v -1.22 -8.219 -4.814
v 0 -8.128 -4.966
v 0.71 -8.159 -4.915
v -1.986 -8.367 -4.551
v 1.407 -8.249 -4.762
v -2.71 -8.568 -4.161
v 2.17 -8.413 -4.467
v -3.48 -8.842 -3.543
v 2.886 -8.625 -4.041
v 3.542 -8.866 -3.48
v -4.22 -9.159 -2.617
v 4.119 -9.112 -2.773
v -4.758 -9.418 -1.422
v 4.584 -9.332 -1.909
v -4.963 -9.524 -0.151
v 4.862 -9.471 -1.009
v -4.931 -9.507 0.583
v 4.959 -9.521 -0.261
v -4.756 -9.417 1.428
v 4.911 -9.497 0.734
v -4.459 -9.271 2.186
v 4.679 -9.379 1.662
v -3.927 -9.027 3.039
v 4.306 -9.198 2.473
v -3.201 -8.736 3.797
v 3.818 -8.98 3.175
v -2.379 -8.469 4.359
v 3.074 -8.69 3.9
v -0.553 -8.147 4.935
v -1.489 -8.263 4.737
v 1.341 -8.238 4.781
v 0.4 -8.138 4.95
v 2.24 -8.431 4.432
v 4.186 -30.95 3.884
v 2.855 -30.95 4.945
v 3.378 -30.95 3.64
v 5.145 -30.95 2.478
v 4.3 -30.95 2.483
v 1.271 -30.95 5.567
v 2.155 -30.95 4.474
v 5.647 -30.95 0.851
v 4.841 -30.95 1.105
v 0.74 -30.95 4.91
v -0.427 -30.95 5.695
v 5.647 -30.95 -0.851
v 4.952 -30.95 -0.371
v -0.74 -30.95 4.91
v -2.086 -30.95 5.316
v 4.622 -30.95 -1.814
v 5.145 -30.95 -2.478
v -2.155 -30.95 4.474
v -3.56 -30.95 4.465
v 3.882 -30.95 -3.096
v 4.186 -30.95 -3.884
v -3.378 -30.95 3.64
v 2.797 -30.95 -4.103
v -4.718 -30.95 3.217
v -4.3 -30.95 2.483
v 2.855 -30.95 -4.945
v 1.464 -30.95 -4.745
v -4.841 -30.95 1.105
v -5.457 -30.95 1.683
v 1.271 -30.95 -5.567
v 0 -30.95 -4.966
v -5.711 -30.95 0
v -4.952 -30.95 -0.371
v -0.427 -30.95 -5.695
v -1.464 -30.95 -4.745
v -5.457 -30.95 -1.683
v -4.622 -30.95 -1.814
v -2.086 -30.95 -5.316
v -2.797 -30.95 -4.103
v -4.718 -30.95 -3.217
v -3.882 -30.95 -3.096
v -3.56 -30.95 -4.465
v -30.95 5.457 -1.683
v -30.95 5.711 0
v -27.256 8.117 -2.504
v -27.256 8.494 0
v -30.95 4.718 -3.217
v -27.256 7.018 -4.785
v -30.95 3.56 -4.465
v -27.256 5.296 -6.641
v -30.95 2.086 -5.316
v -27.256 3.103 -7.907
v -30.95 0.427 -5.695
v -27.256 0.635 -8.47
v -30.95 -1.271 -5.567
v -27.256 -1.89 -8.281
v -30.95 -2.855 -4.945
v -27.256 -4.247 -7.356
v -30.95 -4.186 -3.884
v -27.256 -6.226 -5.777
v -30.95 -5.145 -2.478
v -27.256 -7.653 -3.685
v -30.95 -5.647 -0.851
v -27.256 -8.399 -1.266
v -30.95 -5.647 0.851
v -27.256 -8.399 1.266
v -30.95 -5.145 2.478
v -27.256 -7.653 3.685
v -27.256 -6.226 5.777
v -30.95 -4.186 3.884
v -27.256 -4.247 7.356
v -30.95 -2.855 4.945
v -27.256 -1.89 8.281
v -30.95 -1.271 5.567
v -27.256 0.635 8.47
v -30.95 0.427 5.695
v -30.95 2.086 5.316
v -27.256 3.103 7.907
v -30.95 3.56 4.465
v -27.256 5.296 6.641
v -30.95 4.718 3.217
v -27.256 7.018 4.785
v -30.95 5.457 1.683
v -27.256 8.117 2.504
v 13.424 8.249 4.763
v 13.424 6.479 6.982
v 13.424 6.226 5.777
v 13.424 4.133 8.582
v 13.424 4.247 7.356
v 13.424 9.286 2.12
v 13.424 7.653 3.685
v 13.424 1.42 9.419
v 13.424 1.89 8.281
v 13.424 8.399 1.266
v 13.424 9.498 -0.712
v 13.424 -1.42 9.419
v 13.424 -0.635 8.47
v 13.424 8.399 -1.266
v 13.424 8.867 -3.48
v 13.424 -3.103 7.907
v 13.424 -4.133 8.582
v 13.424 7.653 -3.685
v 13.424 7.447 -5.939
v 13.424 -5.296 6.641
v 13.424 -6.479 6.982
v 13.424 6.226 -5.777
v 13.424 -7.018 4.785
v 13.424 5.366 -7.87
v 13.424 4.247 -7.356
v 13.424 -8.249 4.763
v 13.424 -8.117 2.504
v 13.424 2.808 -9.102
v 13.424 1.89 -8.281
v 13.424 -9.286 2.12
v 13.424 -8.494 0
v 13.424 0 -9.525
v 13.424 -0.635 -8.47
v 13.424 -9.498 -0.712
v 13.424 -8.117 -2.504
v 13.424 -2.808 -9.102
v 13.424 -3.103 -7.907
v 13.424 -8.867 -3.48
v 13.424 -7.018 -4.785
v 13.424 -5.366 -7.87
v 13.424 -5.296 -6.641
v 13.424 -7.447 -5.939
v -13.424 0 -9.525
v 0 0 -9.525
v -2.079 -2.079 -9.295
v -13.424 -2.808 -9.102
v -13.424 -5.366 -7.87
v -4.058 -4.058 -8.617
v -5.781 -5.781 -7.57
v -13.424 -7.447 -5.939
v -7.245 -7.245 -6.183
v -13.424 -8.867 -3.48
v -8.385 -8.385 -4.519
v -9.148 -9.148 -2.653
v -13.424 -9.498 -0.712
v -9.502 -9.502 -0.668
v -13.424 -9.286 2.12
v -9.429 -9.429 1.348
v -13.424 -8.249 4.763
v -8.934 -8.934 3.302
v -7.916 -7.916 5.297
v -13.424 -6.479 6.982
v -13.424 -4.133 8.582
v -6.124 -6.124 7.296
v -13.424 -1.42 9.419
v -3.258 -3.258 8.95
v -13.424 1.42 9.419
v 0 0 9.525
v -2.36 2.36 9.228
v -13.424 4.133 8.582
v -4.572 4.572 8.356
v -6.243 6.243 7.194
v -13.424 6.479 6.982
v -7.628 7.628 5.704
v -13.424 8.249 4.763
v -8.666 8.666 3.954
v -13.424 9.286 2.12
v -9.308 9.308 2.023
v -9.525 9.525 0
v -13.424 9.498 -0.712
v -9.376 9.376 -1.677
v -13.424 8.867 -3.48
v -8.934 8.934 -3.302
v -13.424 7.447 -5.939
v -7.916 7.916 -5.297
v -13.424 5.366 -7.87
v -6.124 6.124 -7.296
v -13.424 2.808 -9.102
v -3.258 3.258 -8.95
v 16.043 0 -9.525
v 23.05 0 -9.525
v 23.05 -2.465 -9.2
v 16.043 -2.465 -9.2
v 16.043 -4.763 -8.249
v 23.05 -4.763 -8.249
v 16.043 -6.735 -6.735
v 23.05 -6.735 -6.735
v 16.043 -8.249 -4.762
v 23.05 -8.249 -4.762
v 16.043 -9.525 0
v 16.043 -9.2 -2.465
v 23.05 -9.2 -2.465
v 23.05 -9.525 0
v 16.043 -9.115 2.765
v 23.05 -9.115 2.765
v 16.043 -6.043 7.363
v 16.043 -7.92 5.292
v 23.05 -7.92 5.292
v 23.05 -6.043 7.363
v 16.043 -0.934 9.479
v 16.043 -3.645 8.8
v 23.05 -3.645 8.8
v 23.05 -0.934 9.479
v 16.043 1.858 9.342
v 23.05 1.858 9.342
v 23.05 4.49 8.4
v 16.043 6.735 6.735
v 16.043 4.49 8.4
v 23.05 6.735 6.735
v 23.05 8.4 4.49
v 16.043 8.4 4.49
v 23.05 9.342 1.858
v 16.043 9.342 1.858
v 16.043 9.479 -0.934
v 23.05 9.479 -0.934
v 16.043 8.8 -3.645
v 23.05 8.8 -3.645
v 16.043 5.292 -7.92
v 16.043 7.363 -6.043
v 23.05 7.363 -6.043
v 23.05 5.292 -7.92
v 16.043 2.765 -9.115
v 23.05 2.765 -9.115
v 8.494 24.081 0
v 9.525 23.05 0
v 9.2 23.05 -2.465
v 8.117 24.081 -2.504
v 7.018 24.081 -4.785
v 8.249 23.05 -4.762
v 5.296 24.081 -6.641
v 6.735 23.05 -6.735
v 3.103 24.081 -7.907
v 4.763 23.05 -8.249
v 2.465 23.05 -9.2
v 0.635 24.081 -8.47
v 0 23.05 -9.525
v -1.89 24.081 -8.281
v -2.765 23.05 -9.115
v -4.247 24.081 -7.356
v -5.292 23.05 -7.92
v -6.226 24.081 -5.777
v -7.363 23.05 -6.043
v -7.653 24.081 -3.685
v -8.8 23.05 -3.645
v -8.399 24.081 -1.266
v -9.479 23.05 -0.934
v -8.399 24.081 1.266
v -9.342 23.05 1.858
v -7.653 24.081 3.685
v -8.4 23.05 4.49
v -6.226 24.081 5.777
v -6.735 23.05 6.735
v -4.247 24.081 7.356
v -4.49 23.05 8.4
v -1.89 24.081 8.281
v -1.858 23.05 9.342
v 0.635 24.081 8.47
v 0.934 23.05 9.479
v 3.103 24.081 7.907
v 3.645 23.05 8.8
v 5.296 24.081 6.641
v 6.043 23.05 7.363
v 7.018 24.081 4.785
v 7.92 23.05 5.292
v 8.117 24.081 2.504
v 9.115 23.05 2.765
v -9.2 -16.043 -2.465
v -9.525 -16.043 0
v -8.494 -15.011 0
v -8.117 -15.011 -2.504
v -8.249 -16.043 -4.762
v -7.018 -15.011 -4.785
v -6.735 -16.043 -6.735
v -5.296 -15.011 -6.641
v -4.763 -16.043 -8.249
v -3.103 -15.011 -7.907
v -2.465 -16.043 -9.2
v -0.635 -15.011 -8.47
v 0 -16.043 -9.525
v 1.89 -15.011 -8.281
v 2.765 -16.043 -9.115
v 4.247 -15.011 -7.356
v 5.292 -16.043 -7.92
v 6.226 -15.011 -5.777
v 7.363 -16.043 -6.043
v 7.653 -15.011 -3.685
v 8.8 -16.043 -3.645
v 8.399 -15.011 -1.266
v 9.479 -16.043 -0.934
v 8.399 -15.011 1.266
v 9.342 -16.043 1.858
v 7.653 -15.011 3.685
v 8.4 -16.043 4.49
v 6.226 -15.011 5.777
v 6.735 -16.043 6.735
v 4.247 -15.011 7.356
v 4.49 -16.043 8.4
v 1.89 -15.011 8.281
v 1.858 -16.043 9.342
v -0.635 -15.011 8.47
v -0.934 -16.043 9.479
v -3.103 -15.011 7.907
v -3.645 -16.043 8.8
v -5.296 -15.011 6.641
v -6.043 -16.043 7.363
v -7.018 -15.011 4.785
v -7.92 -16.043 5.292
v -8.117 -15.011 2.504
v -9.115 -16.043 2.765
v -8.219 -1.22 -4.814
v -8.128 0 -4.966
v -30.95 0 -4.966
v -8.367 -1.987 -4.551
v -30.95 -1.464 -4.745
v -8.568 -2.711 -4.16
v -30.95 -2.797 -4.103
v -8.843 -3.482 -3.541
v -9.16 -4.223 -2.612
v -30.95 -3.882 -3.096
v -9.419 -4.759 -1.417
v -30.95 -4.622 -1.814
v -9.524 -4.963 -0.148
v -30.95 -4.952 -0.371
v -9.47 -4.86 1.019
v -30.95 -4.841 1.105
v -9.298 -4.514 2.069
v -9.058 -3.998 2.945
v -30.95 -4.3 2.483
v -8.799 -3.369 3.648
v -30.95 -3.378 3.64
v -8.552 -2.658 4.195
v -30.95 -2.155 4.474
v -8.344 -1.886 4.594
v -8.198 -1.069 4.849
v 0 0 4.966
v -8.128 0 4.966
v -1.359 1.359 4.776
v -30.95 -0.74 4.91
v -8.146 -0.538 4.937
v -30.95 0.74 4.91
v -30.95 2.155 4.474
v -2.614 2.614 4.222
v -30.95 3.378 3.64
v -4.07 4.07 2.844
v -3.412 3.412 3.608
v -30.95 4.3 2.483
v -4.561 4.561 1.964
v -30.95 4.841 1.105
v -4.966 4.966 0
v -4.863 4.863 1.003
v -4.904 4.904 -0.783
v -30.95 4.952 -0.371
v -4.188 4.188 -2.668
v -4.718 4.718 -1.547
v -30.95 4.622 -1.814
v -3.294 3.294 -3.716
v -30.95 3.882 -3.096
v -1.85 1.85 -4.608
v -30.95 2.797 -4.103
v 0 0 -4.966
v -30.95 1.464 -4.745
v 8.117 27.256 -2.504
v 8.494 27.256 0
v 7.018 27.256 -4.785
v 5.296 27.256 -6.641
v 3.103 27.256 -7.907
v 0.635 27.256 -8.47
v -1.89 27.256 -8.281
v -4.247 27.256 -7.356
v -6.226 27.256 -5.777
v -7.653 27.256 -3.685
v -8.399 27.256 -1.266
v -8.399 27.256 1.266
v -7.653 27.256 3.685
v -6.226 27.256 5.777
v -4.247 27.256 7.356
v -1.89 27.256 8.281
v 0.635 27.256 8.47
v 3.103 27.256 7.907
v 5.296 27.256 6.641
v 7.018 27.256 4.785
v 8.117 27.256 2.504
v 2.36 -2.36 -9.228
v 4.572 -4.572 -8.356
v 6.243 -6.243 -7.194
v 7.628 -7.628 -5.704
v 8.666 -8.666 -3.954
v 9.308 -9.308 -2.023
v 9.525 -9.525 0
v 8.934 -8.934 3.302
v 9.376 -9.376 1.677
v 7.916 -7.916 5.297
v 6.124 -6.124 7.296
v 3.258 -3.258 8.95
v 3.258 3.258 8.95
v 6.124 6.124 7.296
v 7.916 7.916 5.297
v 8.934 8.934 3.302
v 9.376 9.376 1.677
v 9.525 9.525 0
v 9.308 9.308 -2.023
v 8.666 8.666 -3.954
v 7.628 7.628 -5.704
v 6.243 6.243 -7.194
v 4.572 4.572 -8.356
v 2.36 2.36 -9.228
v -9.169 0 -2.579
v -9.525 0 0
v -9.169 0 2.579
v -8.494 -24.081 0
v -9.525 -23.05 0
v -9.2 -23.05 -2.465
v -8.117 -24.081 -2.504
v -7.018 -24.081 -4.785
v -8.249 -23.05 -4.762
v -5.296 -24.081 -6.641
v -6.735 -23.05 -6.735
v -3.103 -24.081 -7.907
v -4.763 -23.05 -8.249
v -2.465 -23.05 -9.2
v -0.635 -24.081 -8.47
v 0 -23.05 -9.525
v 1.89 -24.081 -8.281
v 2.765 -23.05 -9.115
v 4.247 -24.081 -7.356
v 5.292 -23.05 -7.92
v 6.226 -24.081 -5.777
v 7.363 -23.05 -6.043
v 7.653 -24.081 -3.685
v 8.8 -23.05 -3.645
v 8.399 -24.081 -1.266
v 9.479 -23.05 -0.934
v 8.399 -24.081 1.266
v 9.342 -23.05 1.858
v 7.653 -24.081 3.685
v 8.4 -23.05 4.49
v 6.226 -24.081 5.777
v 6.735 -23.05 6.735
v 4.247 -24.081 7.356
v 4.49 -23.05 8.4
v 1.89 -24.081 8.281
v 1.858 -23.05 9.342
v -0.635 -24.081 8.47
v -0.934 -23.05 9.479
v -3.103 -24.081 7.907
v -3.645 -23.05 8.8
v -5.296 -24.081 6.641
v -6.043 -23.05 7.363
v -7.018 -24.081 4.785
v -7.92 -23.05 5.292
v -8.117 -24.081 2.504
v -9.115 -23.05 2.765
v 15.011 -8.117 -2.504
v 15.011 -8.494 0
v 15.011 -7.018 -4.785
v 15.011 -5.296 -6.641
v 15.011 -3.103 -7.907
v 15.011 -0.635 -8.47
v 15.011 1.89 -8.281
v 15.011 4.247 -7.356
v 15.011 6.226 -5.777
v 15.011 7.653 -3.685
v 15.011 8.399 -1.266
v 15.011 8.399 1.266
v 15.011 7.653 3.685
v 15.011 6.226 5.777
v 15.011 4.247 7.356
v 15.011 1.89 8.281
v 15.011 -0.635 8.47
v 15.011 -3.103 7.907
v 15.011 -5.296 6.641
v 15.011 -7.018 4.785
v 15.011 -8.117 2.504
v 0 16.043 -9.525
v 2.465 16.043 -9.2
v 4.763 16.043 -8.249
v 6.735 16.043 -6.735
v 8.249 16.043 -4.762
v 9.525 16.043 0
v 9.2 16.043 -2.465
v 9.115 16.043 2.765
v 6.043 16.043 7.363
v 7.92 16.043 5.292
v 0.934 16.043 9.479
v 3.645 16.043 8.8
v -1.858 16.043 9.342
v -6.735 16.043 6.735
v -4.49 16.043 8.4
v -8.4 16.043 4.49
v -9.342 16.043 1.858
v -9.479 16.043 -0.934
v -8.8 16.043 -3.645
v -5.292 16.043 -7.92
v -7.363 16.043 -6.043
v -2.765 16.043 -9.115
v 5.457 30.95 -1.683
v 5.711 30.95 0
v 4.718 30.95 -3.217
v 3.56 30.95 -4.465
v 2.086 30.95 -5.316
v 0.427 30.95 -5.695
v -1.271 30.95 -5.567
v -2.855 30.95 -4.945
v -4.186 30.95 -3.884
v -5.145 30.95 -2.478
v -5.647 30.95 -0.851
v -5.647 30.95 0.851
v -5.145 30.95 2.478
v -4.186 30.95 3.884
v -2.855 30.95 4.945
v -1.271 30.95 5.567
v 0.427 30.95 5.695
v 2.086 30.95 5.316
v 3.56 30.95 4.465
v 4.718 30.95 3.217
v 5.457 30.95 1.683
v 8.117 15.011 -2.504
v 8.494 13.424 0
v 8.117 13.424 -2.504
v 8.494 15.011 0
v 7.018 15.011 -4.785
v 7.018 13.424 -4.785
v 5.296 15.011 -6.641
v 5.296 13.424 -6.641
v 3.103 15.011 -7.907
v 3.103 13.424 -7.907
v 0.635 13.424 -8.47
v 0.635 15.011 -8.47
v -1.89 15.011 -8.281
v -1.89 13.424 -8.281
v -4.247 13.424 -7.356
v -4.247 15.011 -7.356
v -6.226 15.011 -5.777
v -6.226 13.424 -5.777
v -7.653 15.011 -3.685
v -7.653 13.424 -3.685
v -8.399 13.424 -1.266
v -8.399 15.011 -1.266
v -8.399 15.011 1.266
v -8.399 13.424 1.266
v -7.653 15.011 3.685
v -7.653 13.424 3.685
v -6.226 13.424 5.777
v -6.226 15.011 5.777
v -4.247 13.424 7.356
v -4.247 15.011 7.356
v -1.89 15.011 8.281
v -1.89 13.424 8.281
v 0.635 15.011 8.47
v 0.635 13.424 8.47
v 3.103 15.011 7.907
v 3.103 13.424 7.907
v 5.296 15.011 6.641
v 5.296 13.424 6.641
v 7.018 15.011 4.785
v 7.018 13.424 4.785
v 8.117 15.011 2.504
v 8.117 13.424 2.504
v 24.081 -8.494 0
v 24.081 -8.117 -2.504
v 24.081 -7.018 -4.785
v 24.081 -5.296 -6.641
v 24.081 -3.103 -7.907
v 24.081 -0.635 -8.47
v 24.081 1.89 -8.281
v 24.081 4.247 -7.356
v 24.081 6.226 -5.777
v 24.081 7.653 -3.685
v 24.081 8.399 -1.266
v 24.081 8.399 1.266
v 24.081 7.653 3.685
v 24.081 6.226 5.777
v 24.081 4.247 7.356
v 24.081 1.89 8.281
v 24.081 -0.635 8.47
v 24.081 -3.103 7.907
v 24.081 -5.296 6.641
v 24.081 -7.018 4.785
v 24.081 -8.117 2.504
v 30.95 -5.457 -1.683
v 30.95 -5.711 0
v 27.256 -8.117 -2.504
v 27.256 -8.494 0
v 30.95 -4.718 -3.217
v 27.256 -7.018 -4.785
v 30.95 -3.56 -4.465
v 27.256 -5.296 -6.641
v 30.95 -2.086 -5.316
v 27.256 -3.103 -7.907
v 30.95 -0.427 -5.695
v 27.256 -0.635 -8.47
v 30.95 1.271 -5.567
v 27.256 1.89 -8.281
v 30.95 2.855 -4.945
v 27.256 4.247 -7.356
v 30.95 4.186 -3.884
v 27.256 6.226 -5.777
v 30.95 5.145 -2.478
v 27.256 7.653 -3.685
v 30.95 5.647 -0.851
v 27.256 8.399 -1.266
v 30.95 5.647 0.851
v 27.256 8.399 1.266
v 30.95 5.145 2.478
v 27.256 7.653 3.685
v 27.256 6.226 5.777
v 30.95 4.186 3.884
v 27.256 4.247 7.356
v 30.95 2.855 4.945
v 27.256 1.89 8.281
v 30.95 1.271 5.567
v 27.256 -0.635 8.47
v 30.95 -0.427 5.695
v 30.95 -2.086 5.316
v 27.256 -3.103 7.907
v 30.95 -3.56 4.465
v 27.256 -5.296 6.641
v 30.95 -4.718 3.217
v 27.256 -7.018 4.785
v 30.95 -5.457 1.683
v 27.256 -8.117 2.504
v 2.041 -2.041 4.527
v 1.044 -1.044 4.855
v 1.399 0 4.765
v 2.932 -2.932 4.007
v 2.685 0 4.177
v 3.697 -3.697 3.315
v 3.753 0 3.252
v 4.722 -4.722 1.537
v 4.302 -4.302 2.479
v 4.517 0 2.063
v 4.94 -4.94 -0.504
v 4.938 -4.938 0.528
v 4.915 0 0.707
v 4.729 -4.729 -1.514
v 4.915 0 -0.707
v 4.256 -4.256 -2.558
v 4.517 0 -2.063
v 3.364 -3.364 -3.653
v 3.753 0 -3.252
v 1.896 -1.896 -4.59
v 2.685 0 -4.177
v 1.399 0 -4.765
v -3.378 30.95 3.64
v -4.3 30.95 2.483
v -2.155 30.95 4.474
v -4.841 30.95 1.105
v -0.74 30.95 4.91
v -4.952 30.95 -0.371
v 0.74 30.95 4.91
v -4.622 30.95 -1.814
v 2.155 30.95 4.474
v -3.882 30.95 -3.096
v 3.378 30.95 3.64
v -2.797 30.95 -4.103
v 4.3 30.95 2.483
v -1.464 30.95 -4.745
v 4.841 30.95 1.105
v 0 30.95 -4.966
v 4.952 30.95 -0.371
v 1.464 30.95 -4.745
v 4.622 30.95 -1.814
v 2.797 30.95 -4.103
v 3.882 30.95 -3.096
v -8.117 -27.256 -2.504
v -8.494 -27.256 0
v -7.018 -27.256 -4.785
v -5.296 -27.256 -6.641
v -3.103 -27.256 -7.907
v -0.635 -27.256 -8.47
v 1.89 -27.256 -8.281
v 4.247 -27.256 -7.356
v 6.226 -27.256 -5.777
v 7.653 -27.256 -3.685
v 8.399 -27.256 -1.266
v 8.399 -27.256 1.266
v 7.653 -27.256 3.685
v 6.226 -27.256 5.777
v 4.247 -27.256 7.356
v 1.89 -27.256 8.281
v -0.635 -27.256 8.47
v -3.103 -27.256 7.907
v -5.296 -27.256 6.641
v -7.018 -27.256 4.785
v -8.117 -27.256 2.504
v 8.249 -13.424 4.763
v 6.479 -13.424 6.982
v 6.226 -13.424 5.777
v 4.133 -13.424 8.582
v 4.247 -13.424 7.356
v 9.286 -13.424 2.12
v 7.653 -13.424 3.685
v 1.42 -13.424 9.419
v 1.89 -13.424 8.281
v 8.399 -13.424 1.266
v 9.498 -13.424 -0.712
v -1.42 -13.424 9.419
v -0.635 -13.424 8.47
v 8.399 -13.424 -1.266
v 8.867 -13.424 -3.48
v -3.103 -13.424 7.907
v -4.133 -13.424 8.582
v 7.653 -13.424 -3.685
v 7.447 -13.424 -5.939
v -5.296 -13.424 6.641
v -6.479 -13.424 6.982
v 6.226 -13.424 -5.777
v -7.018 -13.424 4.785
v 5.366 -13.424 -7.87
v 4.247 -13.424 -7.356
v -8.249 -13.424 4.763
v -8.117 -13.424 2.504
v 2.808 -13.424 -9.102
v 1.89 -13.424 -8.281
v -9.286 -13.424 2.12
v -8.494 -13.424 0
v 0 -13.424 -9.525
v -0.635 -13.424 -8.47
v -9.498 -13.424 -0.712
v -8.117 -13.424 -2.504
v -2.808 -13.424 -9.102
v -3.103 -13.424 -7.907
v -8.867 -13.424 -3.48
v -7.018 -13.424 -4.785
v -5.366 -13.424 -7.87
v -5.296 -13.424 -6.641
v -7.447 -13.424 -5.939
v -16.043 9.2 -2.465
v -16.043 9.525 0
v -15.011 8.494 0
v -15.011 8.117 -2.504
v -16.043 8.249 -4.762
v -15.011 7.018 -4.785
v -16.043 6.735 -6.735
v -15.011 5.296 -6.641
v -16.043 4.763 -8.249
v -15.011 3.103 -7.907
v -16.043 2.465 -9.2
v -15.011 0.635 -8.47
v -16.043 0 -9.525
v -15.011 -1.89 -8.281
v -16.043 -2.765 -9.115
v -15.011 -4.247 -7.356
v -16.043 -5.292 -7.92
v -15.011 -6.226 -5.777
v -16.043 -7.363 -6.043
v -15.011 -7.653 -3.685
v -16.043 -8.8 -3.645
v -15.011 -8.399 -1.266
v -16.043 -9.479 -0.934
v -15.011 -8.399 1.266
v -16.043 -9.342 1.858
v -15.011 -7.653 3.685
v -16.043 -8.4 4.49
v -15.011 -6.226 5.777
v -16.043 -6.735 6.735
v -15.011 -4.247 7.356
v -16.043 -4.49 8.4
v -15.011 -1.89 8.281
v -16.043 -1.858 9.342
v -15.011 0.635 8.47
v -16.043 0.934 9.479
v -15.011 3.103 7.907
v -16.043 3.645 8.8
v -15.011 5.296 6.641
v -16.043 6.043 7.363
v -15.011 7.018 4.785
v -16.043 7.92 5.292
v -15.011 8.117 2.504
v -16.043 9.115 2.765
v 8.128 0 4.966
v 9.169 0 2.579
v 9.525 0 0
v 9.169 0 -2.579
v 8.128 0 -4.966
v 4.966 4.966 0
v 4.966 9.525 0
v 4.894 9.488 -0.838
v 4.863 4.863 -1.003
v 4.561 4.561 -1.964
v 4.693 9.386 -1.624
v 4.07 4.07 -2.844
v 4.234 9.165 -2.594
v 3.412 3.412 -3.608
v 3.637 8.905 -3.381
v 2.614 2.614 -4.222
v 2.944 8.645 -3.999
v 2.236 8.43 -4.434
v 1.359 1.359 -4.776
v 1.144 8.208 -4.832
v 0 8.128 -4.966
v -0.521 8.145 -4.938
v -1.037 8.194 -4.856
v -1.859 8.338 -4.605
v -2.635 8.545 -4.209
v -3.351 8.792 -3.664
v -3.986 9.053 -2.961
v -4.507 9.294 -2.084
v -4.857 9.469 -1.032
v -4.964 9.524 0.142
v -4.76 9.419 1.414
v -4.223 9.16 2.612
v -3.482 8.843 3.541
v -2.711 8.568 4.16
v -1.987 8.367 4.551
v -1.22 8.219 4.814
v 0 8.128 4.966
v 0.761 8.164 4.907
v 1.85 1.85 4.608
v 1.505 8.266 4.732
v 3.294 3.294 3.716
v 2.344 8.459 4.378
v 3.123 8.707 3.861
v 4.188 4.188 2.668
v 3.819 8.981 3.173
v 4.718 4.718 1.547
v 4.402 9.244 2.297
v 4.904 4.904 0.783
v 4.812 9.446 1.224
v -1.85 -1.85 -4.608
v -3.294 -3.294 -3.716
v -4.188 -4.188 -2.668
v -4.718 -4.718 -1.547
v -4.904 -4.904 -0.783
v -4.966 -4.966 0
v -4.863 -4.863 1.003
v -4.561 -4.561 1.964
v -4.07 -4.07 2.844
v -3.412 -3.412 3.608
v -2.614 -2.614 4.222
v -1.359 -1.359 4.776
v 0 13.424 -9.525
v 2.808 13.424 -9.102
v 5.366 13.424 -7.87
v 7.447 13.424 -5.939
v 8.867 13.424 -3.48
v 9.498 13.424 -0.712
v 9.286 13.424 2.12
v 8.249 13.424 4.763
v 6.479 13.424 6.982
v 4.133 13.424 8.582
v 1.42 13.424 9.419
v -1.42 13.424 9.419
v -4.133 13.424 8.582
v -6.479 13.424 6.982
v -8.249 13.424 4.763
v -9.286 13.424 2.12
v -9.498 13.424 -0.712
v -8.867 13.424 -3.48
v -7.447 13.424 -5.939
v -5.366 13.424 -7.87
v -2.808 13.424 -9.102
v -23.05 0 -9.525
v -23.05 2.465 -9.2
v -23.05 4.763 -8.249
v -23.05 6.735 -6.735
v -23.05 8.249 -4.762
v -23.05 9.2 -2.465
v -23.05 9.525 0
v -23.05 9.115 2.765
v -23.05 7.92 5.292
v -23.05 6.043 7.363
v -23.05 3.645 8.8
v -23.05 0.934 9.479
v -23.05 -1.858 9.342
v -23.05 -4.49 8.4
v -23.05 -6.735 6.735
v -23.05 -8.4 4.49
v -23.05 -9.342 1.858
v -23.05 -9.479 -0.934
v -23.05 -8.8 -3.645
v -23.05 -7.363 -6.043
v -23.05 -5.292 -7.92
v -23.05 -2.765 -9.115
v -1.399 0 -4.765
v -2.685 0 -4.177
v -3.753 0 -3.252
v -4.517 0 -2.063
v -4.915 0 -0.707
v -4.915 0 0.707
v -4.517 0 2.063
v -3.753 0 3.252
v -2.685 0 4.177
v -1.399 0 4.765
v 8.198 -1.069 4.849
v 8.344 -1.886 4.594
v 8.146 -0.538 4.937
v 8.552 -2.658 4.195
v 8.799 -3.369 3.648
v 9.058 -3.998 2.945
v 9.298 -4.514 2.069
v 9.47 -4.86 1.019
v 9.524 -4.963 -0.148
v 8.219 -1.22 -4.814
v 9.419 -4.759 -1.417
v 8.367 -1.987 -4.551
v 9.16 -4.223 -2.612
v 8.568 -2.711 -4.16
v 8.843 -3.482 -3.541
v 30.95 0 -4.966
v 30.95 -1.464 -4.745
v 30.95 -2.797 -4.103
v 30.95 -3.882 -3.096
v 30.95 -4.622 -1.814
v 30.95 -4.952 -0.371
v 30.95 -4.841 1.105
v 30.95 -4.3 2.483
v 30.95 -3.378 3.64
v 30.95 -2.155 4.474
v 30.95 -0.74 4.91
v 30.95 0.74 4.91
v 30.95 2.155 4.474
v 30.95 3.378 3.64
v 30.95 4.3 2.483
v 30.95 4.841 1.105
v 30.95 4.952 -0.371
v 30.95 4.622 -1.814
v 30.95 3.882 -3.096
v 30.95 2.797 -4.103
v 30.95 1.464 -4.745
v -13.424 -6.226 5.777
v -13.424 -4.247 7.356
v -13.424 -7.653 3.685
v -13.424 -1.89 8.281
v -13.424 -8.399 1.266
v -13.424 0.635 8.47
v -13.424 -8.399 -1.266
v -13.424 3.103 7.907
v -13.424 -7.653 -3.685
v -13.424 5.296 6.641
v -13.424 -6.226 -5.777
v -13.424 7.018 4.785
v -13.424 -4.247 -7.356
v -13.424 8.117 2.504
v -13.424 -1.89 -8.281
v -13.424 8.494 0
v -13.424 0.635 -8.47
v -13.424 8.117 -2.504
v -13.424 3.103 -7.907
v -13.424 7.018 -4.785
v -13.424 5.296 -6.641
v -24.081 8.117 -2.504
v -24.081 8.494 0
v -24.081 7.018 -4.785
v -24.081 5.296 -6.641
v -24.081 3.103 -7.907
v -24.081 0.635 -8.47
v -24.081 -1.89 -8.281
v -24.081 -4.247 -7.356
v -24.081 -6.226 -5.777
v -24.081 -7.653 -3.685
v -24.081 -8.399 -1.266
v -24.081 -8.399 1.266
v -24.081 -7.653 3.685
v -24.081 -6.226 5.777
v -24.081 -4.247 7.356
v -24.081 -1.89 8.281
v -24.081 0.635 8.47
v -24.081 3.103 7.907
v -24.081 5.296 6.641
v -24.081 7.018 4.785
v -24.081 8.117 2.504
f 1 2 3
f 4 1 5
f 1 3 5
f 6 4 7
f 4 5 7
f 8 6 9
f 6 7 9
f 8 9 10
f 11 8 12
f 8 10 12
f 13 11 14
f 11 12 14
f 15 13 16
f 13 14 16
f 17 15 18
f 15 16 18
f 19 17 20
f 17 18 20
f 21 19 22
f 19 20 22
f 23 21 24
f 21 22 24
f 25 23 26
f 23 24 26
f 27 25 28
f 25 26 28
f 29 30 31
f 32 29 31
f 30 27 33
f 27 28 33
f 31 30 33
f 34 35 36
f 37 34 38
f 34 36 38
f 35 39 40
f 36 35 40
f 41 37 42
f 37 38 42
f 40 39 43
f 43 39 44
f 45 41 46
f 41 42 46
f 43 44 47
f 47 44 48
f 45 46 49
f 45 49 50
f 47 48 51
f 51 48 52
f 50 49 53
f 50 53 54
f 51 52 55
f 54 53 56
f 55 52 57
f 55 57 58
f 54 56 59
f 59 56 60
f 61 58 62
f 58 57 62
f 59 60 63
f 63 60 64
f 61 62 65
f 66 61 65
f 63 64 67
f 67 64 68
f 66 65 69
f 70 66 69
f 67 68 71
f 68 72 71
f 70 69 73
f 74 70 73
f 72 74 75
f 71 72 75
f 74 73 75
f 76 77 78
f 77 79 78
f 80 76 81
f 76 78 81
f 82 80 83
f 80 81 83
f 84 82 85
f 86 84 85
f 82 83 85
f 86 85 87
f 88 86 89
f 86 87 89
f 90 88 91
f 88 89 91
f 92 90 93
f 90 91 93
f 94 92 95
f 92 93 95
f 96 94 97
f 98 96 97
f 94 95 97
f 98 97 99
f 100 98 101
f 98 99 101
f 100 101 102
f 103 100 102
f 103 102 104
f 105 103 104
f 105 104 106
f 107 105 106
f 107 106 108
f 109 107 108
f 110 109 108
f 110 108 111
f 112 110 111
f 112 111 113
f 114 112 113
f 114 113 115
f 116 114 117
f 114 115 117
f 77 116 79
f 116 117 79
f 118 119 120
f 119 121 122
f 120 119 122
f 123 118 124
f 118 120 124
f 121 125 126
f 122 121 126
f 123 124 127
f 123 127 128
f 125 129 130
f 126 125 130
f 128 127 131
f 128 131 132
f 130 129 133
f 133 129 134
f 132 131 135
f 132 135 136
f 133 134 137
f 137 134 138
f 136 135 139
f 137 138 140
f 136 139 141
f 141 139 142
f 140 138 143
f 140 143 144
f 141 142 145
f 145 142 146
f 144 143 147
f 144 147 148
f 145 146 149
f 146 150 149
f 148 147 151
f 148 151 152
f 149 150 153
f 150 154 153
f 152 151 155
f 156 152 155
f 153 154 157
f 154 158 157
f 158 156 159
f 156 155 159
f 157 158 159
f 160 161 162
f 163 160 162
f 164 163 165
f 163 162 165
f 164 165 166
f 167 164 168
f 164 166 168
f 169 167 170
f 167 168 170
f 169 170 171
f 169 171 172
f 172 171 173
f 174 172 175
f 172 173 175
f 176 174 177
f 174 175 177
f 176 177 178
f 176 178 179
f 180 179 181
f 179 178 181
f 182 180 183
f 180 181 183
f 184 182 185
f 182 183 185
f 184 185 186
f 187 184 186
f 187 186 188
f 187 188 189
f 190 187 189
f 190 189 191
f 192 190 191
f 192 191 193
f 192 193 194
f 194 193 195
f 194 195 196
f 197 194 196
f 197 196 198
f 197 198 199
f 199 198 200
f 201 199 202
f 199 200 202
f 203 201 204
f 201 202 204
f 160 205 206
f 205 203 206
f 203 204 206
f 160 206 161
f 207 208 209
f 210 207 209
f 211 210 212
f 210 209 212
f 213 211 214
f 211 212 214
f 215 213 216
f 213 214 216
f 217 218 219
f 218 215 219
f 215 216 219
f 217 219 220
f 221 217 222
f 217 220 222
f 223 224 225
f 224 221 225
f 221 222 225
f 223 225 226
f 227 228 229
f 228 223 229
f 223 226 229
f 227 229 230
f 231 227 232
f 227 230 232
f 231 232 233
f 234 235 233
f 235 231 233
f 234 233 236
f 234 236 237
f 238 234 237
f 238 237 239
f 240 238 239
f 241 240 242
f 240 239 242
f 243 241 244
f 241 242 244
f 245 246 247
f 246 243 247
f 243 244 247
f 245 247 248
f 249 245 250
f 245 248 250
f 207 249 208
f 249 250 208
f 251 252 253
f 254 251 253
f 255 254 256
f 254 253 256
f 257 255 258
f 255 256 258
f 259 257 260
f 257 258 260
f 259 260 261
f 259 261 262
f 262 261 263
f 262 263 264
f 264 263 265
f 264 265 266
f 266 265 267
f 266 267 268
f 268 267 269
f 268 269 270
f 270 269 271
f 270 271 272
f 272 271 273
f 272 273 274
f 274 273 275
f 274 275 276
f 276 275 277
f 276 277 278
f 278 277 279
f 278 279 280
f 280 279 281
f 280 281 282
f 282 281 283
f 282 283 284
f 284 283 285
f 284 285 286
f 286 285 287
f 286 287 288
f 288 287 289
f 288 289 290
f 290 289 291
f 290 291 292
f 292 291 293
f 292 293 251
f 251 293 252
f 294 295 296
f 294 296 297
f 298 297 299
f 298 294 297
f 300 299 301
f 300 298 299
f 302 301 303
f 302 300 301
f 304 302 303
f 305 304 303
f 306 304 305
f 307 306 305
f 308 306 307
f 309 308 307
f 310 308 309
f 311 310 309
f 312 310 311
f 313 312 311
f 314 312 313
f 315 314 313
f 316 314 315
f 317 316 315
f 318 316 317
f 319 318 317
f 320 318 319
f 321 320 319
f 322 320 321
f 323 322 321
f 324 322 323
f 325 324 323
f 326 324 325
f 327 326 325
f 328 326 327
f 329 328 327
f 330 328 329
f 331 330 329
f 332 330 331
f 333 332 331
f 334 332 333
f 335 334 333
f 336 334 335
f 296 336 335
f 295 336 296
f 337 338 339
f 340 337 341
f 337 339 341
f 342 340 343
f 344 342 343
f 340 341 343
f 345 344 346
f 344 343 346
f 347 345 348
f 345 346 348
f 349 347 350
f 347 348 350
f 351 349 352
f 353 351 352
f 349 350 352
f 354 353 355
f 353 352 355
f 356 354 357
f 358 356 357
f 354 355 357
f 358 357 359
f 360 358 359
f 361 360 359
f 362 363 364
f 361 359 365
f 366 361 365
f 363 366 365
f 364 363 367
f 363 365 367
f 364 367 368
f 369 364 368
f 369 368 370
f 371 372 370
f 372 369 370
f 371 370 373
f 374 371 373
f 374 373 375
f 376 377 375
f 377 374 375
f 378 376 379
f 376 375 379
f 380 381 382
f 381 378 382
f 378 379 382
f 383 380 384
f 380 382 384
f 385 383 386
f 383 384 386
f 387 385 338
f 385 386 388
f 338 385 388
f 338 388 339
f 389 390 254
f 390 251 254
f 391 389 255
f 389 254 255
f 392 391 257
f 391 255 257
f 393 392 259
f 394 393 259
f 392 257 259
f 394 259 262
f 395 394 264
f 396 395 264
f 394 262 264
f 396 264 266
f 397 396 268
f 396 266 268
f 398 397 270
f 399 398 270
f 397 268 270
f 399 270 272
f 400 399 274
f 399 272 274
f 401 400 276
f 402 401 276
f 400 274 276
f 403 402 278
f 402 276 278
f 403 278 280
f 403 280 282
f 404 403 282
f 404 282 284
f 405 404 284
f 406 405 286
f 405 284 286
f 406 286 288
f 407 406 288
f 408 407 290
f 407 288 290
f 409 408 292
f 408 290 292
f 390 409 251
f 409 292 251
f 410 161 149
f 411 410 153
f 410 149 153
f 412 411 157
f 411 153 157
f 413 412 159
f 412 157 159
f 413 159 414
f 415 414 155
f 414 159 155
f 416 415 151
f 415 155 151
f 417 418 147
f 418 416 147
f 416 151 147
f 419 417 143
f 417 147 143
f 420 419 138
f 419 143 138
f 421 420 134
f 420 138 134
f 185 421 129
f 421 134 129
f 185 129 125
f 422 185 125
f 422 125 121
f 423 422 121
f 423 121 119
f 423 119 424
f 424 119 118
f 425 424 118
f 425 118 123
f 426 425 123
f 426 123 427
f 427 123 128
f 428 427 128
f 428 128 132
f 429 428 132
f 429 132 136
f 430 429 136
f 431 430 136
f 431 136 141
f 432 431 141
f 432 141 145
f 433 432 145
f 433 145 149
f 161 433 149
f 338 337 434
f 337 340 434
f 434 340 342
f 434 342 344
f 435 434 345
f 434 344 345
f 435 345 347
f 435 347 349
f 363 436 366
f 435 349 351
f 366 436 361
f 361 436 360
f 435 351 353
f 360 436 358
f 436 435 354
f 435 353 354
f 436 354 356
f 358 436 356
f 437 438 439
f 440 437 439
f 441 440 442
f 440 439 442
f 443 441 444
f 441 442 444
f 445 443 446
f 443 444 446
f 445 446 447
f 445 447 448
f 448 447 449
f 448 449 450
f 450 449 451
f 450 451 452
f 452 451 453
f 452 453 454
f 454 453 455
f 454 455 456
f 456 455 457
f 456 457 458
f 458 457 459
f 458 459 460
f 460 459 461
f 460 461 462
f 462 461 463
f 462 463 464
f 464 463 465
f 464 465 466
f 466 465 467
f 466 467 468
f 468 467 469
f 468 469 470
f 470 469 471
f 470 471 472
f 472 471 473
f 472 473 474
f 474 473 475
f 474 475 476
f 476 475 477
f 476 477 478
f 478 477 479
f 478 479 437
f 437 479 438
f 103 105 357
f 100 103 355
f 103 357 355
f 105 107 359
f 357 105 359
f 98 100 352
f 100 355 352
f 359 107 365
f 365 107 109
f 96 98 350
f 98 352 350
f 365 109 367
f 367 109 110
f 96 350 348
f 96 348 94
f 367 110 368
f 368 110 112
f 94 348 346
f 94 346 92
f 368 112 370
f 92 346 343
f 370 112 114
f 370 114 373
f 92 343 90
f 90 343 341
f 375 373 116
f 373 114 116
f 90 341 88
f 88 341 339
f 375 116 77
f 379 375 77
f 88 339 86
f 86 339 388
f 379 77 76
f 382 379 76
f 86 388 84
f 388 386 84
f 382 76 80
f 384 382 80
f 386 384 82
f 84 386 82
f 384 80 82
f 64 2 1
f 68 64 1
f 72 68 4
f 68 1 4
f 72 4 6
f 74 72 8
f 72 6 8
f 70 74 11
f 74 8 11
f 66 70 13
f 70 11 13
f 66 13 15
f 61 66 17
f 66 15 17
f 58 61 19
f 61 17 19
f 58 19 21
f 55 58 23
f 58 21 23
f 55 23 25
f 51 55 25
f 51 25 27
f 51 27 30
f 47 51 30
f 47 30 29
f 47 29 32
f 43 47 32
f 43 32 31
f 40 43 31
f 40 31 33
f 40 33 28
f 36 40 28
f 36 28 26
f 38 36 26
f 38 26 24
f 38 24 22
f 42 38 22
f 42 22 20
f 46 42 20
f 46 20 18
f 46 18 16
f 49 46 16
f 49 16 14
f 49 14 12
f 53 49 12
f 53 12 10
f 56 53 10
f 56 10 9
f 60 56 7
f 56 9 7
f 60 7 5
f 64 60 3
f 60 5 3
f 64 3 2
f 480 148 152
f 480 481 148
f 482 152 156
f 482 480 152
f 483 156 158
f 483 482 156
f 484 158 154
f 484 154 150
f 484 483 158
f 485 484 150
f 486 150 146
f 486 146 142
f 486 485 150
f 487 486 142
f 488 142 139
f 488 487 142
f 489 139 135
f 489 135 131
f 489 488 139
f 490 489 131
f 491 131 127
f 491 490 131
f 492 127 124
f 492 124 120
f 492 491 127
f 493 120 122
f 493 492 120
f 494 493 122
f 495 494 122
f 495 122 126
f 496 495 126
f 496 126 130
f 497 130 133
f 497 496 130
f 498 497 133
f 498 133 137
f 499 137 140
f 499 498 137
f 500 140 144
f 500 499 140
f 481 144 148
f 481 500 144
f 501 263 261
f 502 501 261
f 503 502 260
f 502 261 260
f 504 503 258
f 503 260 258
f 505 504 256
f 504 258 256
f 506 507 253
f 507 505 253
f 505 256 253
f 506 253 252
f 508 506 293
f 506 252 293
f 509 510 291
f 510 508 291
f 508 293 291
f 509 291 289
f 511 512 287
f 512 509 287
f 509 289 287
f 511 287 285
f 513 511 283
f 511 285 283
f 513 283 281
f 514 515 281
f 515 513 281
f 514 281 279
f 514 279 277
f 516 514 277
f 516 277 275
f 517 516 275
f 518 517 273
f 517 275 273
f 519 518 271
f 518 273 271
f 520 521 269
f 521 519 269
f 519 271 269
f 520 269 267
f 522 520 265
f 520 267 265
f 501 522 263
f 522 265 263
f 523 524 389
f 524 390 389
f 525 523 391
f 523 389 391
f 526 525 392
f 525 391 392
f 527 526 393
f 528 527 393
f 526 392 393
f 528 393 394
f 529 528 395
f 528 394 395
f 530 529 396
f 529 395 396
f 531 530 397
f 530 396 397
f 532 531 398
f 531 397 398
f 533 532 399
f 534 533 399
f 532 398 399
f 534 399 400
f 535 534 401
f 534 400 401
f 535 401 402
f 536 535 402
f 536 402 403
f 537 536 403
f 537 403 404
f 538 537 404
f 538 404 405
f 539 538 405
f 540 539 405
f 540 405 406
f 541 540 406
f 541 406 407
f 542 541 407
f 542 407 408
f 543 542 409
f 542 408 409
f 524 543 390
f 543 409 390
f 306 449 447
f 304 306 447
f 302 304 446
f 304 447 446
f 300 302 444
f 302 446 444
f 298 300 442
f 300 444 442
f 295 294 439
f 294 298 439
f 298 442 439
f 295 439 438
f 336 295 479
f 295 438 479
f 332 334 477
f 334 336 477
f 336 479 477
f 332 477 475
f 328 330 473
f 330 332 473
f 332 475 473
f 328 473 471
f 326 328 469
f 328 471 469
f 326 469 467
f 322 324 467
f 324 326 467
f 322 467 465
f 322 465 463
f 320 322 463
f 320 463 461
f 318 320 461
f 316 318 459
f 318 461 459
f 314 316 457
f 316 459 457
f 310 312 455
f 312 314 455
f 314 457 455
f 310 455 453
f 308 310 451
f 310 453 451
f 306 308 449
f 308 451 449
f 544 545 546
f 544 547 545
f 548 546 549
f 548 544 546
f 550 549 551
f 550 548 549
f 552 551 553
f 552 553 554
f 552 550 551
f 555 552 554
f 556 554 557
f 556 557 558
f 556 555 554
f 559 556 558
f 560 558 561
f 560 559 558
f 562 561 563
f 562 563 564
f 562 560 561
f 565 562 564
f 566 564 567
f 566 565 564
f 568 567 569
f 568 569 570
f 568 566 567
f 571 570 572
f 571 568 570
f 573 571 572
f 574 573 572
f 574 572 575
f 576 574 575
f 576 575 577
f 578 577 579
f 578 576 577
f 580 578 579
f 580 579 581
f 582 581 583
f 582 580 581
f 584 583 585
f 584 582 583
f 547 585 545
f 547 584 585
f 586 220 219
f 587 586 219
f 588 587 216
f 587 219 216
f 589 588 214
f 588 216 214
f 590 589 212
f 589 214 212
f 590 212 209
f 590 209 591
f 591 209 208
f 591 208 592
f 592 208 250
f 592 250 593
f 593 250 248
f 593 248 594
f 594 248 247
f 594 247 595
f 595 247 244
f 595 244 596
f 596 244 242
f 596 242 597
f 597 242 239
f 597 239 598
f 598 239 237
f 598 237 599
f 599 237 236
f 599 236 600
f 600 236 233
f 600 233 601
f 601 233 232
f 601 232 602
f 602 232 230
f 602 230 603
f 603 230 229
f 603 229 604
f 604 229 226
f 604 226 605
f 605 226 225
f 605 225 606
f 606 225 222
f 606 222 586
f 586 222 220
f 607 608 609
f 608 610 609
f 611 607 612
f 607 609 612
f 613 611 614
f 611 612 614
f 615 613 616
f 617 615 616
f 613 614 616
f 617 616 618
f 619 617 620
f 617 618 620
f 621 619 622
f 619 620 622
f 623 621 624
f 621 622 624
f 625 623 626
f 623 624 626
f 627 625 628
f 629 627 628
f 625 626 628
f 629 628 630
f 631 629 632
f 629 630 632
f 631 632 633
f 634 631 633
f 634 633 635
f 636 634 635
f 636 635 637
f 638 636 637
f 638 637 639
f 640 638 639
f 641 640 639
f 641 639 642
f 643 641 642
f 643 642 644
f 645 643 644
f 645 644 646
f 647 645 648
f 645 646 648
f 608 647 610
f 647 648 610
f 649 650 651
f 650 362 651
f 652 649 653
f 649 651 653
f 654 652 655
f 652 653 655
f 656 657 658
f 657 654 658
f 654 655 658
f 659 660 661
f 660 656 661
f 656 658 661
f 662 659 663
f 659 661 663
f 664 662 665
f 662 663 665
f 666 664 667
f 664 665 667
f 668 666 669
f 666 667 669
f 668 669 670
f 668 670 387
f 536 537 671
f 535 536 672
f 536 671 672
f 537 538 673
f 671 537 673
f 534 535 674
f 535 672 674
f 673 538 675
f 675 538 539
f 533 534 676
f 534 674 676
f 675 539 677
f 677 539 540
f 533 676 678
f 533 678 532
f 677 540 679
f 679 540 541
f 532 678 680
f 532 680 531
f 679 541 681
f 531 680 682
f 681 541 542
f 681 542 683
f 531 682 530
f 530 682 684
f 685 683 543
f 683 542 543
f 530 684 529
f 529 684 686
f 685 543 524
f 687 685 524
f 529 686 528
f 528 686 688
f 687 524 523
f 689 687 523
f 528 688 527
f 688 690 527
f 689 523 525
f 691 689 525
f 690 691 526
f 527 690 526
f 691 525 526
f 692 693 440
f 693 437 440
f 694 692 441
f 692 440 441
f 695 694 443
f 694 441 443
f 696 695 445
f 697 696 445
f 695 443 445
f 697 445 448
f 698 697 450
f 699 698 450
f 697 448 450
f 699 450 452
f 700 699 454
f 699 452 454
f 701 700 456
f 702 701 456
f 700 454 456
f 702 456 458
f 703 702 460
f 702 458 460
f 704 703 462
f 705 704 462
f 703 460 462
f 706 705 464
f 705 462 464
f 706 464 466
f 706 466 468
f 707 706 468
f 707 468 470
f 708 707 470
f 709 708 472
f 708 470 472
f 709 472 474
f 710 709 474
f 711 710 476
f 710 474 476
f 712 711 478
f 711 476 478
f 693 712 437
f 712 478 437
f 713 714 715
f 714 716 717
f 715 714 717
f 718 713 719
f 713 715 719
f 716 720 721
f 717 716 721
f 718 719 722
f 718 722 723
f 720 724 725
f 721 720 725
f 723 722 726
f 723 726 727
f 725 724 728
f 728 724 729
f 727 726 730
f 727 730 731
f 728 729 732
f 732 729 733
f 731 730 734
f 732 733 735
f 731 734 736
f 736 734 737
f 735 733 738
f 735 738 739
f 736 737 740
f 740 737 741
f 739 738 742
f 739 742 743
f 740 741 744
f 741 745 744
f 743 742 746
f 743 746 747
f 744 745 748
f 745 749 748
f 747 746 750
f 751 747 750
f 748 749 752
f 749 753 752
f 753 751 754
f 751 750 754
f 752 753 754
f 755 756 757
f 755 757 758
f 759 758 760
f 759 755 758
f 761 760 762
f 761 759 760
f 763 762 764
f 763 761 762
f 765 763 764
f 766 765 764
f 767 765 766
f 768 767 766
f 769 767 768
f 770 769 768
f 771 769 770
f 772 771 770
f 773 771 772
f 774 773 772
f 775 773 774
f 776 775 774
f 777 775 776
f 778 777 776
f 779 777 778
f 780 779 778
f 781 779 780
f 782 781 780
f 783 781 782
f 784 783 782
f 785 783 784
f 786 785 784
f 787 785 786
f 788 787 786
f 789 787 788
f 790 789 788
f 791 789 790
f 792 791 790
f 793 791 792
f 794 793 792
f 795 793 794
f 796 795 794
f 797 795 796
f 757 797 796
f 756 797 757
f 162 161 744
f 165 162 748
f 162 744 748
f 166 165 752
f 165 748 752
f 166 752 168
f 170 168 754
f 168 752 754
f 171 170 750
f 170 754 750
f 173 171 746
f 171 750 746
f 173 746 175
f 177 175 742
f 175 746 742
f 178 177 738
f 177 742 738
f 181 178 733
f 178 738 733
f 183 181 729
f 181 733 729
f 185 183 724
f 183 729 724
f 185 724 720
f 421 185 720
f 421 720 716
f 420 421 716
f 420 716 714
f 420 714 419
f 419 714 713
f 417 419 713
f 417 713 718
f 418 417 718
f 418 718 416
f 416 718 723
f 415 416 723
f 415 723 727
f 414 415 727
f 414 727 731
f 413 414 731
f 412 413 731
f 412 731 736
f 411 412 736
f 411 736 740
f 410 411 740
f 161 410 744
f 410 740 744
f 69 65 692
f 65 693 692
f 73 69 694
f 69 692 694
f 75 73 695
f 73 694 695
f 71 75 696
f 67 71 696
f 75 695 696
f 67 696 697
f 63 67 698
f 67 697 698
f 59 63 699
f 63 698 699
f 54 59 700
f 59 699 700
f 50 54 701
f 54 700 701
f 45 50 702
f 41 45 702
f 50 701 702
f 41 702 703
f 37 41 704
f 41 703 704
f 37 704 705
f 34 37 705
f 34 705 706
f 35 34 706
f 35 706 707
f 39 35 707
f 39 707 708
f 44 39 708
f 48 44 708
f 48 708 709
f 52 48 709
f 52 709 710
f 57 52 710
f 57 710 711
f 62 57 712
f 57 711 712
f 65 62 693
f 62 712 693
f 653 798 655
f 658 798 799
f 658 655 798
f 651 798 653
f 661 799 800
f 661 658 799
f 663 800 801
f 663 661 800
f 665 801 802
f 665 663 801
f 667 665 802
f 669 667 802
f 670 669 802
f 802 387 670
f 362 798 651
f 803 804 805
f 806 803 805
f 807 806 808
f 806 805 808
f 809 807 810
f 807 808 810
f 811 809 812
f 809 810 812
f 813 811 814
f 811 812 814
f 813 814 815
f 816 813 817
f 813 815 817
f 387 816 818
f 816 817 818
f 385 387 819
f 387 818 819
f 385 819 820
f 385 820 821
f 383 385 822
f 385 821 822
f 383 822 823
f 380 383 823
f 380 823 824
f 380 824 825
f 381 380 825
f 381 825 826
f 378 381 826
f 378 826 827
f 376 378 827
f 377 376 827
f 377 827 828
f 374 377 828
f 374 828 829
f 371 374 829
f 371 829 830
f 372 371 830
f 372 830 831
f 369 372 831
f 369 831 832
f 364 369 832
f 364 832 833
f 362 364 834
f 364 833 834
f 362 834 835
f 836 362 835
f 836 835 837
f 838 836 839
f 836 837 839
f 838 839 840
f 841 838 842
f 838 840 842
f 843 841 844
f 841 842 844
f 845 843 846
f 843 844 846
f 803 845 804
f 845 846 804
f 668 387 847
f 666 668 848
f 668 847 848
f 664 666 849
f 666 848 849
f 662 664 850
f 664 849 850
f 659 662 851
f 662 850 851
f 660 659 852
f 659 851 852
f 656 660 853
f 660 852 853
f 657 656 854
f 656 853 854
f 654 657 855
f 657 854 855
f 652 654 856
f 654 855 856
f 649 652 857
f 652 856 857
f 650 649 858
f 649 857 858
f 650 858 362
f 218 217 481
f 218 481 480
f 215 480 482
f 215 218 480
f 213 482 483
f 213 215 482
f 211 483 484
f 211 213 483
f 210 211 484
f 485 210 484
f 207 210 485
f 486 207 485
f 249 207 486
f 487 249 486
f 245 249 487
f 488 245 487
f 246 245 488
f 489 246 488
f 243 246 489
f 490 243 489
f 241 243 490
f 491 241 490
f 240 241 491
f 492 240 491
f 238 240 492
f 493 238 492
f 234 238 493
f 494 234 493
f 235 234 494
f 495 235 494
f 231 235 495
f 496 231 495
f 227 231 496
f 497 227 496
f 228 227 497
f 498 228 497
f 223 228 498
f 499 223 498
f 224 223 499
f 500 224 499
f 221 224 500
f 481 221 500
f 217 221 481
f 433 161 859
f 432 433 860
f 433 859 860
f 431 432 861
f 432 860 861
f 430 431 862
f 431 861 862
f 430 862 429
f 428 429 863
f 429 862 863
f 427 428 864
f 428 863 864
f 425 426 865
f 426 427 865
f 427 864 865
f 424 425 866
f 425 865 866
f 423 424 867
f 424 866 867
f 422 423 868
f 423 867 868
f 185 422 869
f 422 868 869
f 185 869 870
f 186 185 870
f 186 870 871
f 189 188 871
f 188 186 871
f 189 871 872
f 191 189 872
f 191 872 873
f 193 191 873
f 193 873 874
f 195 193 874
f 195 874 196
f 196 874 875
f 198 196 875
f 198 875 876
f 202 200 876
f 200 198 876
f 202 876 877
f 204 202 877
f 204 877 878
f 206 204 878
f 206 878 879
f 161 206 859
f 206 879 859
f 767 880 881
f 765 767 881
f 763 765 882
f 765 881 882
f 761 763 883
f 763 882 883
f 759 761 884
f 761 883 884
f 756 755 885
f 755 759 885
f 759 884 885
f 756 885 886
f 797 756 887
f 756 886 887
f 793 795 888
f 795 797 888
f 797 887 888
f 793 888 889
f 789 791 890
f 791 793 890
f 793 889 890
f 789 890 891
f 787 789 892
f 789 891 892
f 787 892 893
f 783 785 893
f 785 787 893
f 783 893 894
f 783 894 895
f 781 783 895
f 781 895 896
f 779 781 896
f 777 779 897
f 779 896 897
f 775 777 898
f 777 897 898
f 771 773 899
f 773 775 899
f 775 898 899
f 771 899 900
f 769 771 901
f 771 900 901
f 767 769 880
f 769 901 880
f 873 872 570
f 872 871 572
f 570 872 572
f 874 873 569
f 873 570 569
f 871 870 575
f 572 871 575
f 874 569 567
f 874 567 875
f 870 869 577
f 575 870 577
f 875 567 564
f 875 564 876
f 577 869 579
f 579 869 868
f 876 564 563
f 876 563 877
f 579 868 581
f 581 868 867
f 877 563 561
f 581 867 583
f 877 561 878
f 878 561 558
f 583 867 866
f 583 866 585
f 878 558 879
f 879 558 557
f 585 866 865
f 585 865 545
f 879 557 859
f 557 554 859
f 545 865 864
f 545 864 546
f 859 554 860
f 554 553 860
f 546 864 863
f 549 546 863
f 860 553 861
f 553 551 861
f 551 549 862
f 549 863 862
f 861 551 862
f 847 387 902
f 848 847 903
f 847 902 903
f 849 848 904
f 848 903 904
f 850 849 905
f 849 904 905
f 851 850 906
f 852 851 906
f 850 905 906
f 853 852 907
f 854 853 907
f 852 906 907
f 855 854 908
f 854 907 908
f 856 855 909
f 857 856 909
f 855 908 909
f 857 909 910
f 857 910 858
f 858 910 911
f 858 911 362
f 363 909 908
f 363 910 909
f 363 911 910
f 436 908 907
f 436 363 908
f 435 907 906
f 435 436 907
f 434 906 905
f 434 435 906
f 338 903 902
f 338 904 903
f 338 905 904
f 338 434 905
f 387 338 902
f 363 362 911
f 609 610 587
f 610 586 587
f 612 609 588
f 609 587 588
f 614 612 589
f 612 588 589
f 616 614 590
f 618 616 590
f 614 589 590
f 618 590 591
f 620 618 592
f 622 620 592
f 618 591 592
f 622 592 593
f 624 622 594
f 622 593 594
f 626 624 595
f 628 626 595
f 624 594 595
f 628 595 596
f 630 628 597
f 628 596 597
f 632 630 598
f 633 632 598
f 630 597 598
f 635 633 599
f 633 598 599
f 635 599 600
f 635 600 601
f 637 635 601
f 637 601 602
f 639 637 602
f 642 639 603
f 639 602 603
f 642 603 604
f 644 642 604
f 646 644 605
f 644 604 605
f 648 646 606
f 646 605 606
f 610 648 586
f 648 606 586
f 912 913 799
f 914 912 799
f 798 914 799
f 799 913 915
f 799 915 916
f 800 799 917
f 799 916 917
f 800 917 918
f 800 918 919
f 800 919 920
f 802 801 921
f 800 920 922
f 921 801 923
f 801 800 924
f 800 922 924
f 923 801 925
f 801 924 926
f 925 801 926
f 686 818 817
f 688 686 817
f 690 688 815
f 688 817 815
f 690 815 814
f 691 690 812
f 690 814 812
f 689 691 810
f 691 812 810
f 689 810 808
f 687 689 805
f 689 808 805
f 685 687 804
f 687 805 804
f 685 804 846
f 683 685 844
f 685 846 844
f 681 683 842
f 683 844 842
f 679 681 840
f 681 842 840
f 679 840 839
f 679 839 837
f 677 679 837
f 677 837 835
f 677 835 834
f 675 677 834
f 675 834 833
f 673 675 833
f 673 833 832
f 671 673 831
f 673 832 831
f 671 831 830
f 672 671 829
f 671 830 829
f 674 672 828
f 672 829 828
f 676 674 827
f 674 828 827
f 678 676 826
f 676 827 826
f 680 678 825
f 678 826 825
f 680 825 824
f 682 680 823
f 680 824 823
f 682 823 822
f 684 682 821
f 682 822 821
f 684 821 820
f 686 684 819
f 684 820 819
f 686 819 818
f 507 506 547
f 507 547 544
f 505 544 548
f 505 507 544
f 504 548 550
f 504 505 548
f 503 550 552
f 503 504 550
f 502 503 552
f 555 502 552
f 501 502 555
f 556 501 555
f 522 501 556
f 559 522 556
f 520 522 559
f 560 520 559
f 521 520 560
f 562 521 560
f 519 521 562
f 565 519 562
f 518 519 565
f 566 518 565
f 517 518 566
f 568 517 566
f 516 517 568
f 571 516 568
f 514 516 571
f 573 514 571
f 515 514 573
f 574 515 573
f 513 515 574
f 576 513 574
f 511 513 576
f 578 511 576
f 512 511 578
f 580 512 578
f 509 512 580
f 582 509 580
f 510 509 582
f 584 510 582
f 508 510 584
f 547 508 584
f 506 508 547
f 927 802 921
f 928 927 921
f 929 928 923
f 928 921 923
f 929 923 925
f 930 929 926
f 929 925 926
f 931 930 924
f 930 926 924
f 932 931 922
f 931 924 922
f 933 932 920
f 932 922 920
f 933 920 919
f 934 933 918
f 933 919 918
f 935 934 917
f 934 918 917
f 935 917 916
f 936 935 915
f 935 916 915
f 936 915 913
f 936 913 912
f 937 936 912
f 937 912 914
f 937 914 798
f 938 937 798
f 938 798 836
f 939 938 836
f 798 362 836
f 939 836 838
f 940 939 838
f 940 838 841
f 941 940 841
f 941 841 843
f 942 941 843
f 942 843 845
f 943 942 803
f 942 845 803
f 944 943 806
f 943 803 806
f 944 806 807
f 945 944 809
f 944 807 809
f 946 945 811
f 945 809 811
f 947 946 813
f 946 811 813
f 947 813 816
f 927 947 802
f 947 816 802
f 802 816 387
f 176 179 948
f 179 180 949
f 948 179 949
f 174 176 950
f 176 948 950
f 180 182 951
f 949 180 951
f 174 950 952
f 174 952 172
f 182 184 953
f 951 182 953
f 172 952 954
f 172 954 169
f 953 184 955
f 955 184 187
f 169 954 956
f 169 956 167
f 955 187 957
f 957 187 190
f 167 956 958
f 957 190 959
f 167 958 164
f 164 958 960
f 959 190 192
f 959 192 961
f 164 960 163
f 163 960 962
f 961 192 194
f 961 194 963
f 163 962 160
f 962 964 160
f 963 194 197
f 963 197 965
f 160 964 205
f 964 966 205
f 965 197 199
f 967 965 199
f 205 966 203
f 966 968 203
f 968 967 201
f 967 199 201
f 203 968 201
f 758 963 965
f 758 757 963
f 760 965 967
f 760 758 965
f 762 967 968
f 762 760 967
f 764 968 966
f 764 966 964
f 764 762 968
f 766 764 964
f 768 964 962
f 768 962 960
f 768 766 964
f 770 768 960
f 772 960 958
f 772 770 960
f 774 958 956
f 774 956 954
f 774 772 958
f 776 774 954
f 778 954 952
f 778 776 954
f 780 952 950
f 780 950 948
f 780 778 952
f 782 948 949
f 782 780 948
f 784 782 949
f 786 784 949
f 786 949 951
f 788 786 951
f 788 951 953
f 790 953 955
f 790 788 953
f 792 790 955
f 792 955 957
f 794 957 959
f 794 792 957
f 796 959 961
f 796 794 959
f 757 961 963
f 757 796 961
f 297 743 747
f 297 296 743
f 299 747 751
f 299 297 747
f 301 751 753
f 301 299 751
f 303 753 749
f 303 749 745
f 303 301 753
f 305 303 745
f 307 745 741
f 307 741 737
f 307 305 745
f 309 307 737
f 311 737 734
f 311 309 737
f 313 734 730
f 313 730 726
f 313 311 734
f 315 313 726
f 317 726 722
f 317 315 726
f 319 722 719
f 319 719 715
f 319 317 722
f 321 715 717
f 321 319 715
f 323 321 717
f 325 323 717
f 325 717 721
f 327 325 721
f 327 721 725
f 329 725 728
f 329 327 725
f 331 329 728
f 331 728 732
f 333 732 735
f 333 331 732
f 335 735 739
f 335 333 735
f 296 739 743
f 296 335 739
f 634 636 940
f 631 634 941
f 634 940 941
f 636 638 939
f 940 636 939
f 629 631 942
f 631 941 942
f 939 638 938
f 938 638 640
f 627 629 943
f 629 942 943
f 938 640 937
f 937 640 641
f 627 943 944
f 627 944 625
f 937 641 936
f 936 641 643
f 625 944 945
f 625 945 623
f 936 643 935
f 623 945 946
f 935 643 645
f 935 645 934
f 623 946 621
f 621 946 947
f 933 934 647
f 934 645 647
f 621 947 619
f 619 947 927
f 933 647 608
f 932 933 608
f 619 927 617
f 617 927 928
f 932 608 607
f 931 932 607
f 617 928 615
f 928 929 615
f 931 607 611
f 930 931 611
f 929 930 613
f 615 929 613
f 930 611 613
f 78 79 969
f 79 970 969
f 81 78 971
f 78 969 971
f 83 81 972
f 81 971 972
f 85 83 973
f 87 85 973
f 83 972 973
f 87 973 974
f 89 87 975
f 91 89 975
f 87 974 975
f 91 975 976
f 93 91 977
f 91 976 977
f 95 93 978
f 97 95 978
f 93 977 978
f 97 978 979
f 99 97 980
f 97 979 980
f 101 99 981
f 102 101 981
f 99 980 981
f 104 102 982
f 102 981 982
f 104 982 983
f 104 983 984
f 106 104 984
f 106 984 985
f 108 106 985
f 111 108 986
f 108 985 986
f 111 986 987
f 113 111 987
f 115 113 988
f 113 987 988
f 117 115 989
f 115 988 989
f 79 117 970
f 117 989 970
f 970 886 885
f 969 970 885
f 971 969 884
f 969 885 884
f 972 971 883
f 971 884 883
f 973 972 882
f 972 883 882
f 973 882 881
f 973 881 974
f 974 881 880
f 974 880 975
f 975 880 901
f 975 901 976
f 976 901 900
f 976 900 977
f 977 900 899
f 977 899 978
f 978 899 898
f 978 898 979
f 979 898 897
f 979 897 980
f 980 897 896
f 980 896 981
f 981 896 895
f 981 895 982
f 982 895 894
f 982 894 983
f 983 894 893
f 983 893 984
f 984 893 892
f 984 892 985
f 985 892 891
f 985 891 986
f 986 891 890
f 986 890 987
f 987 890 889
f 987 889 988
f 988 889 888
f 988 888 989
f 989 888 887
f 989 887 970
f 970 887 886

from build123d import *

# Parameters (mm, degrees)
SKETCH2_R           = 9.525
EXTRUDE1_DEPTH      = 17.526
SKETCH15_R          = 9.525
BOSS_EXTRUDE1_DEPTH = 13.4239
SKETCH16_R          = 4.9657
CUT_EXTRUDE1_DEPTH  = 31.9499
CIRPATTERN1_COUNT   = 4
CIRPATTERN1_ANGLE   = 270
SKETCH17_R          = 4.9657
CUT_EXTRUDE2_DEPTH  = 62.8998
CUT_EXTRUDE3_REACH  = 63.9
SKETCH18_R          = 4.9657


with BuildPart() as part:
    # Sketch2 → Extrude1 (new body)
    with BuildSketch(Plane(origin=(-30.9499, 0, 0), x_dir=(0, 0, -1), z_dir=(1, 0, 0))):
        Circle(SKETCH2_R)
    extrude(amount=EXTRUDE1_DEPTH)

    # Sketch5 → Cut-Revolve1 (revolve, cut)
    with BuildSketch(Plane.XY):
        Polygon((-27.256291687, 8.493888504), (-24.081291687, 8.493888504), (-23.050180191, 9.525), (-30.9499, 9.525), (-30.9499, 5.710555), align=None)
        Polygon((-13.4239, 8.493888504), (-15.0114, 8.493888504), (-16.042511496, 9.525), (-13.4239, 9.525), align=None)
    revolve(axis=Axis((0, 0, 0), (-1, 0, 0)), mode=Mode.SUBTRACT)

    # Sketch15 → Boss-Extrude1 (add)
    with BuildSketch(Plane(origin=(-13.4239, 0, 0), x_dir=(0, 0, -1), z_dir=(1, 0, 0))):
        Circle(SKETCH15_R)
    extrude(amount=BOSS_EXTRUDE1_DEPTH)

    # Sketch16 → Cut-Extrude1 (cut, through all)
    with BuildSketch(Plane(origin=(0, 0, 0), x_dir=(0, 0, -1), z_dir=(1, 0, 0))):
        Circle(SKETCH16_R)
    extrude(amount=-CUT_EXTRUDE1_DEPTH, mode=Mode.SUBTRACT)


with BuildPart() as cirpattern1_1:
    # CirPattern1: pattern copy
    add(part.part.rotate(Axis((0, 0, 0), (0, 0, -1)), 1 * CIRPATTERN1_ANGLE / (CIRPATTERN1_COUNT - 1)))

    # Sketch17 → Cut-Extrude2 (cut, through all)
    with BuildSketch(Plane.ZY.offset(30.9499)):
        Circle(SKETCH17_R)
    extrude(amount=-CUT_EXTRUDE2_DEPTH, mode=Mode.SUBTRACT)


with BuildPart() as cirpattern1_2:
    # CirPattern1: pattern copy
    add(part.part.rotate(Axis((0, 0, 0), (0, 0, -1)), 2 * CIRPATTERN1_ANGLE / (CIRPATTERN1_COUNT - 1)))


with BuildPart() as cirpattern1_3:
    # CirPattern1: pattern copy
    add(part.part.rotate(Axis((0, 0, 0), (0, 0, -1)), 3 * CIRPATTERN1_ANGLE / (CIRPATTERN1_COUNT - 1)))


with BuildPart() as cirpattern1_1_1:
    add(cirpattern1_1.part)

    # Combine1: union part, CirPattern1_2, CirPattern1_3
    add(part.part)
    add(cirpattern1_2.part)
    add(cirpattern1_3.part)

    # Sketch18 → Cut-Extrude3 (cut, up to next)
    with BuildSketch(Plane(origin=(0, 30.9499, 0), x_dir=(1, 0, 0), z_dir=(0, 1, 0)), mode=Mode.PRIVATE) as cut_extrude3_sk1:
        Circle(SKETCH18_R)
    cut_extrude3_tool1 = extrude(cut_extrude3_sk1.sketch, amount=-CUT_EXTRUDE3_REACH, mode=Mode.PRIVATE) & cirpattern1_1_1.part
    add(cut_extrude3_tool1.solids().sort_by_distance((0, 30.9499, 0))[0], mode=Mode.SUBTRACT)


solid = cirpattern1_1_1.part
